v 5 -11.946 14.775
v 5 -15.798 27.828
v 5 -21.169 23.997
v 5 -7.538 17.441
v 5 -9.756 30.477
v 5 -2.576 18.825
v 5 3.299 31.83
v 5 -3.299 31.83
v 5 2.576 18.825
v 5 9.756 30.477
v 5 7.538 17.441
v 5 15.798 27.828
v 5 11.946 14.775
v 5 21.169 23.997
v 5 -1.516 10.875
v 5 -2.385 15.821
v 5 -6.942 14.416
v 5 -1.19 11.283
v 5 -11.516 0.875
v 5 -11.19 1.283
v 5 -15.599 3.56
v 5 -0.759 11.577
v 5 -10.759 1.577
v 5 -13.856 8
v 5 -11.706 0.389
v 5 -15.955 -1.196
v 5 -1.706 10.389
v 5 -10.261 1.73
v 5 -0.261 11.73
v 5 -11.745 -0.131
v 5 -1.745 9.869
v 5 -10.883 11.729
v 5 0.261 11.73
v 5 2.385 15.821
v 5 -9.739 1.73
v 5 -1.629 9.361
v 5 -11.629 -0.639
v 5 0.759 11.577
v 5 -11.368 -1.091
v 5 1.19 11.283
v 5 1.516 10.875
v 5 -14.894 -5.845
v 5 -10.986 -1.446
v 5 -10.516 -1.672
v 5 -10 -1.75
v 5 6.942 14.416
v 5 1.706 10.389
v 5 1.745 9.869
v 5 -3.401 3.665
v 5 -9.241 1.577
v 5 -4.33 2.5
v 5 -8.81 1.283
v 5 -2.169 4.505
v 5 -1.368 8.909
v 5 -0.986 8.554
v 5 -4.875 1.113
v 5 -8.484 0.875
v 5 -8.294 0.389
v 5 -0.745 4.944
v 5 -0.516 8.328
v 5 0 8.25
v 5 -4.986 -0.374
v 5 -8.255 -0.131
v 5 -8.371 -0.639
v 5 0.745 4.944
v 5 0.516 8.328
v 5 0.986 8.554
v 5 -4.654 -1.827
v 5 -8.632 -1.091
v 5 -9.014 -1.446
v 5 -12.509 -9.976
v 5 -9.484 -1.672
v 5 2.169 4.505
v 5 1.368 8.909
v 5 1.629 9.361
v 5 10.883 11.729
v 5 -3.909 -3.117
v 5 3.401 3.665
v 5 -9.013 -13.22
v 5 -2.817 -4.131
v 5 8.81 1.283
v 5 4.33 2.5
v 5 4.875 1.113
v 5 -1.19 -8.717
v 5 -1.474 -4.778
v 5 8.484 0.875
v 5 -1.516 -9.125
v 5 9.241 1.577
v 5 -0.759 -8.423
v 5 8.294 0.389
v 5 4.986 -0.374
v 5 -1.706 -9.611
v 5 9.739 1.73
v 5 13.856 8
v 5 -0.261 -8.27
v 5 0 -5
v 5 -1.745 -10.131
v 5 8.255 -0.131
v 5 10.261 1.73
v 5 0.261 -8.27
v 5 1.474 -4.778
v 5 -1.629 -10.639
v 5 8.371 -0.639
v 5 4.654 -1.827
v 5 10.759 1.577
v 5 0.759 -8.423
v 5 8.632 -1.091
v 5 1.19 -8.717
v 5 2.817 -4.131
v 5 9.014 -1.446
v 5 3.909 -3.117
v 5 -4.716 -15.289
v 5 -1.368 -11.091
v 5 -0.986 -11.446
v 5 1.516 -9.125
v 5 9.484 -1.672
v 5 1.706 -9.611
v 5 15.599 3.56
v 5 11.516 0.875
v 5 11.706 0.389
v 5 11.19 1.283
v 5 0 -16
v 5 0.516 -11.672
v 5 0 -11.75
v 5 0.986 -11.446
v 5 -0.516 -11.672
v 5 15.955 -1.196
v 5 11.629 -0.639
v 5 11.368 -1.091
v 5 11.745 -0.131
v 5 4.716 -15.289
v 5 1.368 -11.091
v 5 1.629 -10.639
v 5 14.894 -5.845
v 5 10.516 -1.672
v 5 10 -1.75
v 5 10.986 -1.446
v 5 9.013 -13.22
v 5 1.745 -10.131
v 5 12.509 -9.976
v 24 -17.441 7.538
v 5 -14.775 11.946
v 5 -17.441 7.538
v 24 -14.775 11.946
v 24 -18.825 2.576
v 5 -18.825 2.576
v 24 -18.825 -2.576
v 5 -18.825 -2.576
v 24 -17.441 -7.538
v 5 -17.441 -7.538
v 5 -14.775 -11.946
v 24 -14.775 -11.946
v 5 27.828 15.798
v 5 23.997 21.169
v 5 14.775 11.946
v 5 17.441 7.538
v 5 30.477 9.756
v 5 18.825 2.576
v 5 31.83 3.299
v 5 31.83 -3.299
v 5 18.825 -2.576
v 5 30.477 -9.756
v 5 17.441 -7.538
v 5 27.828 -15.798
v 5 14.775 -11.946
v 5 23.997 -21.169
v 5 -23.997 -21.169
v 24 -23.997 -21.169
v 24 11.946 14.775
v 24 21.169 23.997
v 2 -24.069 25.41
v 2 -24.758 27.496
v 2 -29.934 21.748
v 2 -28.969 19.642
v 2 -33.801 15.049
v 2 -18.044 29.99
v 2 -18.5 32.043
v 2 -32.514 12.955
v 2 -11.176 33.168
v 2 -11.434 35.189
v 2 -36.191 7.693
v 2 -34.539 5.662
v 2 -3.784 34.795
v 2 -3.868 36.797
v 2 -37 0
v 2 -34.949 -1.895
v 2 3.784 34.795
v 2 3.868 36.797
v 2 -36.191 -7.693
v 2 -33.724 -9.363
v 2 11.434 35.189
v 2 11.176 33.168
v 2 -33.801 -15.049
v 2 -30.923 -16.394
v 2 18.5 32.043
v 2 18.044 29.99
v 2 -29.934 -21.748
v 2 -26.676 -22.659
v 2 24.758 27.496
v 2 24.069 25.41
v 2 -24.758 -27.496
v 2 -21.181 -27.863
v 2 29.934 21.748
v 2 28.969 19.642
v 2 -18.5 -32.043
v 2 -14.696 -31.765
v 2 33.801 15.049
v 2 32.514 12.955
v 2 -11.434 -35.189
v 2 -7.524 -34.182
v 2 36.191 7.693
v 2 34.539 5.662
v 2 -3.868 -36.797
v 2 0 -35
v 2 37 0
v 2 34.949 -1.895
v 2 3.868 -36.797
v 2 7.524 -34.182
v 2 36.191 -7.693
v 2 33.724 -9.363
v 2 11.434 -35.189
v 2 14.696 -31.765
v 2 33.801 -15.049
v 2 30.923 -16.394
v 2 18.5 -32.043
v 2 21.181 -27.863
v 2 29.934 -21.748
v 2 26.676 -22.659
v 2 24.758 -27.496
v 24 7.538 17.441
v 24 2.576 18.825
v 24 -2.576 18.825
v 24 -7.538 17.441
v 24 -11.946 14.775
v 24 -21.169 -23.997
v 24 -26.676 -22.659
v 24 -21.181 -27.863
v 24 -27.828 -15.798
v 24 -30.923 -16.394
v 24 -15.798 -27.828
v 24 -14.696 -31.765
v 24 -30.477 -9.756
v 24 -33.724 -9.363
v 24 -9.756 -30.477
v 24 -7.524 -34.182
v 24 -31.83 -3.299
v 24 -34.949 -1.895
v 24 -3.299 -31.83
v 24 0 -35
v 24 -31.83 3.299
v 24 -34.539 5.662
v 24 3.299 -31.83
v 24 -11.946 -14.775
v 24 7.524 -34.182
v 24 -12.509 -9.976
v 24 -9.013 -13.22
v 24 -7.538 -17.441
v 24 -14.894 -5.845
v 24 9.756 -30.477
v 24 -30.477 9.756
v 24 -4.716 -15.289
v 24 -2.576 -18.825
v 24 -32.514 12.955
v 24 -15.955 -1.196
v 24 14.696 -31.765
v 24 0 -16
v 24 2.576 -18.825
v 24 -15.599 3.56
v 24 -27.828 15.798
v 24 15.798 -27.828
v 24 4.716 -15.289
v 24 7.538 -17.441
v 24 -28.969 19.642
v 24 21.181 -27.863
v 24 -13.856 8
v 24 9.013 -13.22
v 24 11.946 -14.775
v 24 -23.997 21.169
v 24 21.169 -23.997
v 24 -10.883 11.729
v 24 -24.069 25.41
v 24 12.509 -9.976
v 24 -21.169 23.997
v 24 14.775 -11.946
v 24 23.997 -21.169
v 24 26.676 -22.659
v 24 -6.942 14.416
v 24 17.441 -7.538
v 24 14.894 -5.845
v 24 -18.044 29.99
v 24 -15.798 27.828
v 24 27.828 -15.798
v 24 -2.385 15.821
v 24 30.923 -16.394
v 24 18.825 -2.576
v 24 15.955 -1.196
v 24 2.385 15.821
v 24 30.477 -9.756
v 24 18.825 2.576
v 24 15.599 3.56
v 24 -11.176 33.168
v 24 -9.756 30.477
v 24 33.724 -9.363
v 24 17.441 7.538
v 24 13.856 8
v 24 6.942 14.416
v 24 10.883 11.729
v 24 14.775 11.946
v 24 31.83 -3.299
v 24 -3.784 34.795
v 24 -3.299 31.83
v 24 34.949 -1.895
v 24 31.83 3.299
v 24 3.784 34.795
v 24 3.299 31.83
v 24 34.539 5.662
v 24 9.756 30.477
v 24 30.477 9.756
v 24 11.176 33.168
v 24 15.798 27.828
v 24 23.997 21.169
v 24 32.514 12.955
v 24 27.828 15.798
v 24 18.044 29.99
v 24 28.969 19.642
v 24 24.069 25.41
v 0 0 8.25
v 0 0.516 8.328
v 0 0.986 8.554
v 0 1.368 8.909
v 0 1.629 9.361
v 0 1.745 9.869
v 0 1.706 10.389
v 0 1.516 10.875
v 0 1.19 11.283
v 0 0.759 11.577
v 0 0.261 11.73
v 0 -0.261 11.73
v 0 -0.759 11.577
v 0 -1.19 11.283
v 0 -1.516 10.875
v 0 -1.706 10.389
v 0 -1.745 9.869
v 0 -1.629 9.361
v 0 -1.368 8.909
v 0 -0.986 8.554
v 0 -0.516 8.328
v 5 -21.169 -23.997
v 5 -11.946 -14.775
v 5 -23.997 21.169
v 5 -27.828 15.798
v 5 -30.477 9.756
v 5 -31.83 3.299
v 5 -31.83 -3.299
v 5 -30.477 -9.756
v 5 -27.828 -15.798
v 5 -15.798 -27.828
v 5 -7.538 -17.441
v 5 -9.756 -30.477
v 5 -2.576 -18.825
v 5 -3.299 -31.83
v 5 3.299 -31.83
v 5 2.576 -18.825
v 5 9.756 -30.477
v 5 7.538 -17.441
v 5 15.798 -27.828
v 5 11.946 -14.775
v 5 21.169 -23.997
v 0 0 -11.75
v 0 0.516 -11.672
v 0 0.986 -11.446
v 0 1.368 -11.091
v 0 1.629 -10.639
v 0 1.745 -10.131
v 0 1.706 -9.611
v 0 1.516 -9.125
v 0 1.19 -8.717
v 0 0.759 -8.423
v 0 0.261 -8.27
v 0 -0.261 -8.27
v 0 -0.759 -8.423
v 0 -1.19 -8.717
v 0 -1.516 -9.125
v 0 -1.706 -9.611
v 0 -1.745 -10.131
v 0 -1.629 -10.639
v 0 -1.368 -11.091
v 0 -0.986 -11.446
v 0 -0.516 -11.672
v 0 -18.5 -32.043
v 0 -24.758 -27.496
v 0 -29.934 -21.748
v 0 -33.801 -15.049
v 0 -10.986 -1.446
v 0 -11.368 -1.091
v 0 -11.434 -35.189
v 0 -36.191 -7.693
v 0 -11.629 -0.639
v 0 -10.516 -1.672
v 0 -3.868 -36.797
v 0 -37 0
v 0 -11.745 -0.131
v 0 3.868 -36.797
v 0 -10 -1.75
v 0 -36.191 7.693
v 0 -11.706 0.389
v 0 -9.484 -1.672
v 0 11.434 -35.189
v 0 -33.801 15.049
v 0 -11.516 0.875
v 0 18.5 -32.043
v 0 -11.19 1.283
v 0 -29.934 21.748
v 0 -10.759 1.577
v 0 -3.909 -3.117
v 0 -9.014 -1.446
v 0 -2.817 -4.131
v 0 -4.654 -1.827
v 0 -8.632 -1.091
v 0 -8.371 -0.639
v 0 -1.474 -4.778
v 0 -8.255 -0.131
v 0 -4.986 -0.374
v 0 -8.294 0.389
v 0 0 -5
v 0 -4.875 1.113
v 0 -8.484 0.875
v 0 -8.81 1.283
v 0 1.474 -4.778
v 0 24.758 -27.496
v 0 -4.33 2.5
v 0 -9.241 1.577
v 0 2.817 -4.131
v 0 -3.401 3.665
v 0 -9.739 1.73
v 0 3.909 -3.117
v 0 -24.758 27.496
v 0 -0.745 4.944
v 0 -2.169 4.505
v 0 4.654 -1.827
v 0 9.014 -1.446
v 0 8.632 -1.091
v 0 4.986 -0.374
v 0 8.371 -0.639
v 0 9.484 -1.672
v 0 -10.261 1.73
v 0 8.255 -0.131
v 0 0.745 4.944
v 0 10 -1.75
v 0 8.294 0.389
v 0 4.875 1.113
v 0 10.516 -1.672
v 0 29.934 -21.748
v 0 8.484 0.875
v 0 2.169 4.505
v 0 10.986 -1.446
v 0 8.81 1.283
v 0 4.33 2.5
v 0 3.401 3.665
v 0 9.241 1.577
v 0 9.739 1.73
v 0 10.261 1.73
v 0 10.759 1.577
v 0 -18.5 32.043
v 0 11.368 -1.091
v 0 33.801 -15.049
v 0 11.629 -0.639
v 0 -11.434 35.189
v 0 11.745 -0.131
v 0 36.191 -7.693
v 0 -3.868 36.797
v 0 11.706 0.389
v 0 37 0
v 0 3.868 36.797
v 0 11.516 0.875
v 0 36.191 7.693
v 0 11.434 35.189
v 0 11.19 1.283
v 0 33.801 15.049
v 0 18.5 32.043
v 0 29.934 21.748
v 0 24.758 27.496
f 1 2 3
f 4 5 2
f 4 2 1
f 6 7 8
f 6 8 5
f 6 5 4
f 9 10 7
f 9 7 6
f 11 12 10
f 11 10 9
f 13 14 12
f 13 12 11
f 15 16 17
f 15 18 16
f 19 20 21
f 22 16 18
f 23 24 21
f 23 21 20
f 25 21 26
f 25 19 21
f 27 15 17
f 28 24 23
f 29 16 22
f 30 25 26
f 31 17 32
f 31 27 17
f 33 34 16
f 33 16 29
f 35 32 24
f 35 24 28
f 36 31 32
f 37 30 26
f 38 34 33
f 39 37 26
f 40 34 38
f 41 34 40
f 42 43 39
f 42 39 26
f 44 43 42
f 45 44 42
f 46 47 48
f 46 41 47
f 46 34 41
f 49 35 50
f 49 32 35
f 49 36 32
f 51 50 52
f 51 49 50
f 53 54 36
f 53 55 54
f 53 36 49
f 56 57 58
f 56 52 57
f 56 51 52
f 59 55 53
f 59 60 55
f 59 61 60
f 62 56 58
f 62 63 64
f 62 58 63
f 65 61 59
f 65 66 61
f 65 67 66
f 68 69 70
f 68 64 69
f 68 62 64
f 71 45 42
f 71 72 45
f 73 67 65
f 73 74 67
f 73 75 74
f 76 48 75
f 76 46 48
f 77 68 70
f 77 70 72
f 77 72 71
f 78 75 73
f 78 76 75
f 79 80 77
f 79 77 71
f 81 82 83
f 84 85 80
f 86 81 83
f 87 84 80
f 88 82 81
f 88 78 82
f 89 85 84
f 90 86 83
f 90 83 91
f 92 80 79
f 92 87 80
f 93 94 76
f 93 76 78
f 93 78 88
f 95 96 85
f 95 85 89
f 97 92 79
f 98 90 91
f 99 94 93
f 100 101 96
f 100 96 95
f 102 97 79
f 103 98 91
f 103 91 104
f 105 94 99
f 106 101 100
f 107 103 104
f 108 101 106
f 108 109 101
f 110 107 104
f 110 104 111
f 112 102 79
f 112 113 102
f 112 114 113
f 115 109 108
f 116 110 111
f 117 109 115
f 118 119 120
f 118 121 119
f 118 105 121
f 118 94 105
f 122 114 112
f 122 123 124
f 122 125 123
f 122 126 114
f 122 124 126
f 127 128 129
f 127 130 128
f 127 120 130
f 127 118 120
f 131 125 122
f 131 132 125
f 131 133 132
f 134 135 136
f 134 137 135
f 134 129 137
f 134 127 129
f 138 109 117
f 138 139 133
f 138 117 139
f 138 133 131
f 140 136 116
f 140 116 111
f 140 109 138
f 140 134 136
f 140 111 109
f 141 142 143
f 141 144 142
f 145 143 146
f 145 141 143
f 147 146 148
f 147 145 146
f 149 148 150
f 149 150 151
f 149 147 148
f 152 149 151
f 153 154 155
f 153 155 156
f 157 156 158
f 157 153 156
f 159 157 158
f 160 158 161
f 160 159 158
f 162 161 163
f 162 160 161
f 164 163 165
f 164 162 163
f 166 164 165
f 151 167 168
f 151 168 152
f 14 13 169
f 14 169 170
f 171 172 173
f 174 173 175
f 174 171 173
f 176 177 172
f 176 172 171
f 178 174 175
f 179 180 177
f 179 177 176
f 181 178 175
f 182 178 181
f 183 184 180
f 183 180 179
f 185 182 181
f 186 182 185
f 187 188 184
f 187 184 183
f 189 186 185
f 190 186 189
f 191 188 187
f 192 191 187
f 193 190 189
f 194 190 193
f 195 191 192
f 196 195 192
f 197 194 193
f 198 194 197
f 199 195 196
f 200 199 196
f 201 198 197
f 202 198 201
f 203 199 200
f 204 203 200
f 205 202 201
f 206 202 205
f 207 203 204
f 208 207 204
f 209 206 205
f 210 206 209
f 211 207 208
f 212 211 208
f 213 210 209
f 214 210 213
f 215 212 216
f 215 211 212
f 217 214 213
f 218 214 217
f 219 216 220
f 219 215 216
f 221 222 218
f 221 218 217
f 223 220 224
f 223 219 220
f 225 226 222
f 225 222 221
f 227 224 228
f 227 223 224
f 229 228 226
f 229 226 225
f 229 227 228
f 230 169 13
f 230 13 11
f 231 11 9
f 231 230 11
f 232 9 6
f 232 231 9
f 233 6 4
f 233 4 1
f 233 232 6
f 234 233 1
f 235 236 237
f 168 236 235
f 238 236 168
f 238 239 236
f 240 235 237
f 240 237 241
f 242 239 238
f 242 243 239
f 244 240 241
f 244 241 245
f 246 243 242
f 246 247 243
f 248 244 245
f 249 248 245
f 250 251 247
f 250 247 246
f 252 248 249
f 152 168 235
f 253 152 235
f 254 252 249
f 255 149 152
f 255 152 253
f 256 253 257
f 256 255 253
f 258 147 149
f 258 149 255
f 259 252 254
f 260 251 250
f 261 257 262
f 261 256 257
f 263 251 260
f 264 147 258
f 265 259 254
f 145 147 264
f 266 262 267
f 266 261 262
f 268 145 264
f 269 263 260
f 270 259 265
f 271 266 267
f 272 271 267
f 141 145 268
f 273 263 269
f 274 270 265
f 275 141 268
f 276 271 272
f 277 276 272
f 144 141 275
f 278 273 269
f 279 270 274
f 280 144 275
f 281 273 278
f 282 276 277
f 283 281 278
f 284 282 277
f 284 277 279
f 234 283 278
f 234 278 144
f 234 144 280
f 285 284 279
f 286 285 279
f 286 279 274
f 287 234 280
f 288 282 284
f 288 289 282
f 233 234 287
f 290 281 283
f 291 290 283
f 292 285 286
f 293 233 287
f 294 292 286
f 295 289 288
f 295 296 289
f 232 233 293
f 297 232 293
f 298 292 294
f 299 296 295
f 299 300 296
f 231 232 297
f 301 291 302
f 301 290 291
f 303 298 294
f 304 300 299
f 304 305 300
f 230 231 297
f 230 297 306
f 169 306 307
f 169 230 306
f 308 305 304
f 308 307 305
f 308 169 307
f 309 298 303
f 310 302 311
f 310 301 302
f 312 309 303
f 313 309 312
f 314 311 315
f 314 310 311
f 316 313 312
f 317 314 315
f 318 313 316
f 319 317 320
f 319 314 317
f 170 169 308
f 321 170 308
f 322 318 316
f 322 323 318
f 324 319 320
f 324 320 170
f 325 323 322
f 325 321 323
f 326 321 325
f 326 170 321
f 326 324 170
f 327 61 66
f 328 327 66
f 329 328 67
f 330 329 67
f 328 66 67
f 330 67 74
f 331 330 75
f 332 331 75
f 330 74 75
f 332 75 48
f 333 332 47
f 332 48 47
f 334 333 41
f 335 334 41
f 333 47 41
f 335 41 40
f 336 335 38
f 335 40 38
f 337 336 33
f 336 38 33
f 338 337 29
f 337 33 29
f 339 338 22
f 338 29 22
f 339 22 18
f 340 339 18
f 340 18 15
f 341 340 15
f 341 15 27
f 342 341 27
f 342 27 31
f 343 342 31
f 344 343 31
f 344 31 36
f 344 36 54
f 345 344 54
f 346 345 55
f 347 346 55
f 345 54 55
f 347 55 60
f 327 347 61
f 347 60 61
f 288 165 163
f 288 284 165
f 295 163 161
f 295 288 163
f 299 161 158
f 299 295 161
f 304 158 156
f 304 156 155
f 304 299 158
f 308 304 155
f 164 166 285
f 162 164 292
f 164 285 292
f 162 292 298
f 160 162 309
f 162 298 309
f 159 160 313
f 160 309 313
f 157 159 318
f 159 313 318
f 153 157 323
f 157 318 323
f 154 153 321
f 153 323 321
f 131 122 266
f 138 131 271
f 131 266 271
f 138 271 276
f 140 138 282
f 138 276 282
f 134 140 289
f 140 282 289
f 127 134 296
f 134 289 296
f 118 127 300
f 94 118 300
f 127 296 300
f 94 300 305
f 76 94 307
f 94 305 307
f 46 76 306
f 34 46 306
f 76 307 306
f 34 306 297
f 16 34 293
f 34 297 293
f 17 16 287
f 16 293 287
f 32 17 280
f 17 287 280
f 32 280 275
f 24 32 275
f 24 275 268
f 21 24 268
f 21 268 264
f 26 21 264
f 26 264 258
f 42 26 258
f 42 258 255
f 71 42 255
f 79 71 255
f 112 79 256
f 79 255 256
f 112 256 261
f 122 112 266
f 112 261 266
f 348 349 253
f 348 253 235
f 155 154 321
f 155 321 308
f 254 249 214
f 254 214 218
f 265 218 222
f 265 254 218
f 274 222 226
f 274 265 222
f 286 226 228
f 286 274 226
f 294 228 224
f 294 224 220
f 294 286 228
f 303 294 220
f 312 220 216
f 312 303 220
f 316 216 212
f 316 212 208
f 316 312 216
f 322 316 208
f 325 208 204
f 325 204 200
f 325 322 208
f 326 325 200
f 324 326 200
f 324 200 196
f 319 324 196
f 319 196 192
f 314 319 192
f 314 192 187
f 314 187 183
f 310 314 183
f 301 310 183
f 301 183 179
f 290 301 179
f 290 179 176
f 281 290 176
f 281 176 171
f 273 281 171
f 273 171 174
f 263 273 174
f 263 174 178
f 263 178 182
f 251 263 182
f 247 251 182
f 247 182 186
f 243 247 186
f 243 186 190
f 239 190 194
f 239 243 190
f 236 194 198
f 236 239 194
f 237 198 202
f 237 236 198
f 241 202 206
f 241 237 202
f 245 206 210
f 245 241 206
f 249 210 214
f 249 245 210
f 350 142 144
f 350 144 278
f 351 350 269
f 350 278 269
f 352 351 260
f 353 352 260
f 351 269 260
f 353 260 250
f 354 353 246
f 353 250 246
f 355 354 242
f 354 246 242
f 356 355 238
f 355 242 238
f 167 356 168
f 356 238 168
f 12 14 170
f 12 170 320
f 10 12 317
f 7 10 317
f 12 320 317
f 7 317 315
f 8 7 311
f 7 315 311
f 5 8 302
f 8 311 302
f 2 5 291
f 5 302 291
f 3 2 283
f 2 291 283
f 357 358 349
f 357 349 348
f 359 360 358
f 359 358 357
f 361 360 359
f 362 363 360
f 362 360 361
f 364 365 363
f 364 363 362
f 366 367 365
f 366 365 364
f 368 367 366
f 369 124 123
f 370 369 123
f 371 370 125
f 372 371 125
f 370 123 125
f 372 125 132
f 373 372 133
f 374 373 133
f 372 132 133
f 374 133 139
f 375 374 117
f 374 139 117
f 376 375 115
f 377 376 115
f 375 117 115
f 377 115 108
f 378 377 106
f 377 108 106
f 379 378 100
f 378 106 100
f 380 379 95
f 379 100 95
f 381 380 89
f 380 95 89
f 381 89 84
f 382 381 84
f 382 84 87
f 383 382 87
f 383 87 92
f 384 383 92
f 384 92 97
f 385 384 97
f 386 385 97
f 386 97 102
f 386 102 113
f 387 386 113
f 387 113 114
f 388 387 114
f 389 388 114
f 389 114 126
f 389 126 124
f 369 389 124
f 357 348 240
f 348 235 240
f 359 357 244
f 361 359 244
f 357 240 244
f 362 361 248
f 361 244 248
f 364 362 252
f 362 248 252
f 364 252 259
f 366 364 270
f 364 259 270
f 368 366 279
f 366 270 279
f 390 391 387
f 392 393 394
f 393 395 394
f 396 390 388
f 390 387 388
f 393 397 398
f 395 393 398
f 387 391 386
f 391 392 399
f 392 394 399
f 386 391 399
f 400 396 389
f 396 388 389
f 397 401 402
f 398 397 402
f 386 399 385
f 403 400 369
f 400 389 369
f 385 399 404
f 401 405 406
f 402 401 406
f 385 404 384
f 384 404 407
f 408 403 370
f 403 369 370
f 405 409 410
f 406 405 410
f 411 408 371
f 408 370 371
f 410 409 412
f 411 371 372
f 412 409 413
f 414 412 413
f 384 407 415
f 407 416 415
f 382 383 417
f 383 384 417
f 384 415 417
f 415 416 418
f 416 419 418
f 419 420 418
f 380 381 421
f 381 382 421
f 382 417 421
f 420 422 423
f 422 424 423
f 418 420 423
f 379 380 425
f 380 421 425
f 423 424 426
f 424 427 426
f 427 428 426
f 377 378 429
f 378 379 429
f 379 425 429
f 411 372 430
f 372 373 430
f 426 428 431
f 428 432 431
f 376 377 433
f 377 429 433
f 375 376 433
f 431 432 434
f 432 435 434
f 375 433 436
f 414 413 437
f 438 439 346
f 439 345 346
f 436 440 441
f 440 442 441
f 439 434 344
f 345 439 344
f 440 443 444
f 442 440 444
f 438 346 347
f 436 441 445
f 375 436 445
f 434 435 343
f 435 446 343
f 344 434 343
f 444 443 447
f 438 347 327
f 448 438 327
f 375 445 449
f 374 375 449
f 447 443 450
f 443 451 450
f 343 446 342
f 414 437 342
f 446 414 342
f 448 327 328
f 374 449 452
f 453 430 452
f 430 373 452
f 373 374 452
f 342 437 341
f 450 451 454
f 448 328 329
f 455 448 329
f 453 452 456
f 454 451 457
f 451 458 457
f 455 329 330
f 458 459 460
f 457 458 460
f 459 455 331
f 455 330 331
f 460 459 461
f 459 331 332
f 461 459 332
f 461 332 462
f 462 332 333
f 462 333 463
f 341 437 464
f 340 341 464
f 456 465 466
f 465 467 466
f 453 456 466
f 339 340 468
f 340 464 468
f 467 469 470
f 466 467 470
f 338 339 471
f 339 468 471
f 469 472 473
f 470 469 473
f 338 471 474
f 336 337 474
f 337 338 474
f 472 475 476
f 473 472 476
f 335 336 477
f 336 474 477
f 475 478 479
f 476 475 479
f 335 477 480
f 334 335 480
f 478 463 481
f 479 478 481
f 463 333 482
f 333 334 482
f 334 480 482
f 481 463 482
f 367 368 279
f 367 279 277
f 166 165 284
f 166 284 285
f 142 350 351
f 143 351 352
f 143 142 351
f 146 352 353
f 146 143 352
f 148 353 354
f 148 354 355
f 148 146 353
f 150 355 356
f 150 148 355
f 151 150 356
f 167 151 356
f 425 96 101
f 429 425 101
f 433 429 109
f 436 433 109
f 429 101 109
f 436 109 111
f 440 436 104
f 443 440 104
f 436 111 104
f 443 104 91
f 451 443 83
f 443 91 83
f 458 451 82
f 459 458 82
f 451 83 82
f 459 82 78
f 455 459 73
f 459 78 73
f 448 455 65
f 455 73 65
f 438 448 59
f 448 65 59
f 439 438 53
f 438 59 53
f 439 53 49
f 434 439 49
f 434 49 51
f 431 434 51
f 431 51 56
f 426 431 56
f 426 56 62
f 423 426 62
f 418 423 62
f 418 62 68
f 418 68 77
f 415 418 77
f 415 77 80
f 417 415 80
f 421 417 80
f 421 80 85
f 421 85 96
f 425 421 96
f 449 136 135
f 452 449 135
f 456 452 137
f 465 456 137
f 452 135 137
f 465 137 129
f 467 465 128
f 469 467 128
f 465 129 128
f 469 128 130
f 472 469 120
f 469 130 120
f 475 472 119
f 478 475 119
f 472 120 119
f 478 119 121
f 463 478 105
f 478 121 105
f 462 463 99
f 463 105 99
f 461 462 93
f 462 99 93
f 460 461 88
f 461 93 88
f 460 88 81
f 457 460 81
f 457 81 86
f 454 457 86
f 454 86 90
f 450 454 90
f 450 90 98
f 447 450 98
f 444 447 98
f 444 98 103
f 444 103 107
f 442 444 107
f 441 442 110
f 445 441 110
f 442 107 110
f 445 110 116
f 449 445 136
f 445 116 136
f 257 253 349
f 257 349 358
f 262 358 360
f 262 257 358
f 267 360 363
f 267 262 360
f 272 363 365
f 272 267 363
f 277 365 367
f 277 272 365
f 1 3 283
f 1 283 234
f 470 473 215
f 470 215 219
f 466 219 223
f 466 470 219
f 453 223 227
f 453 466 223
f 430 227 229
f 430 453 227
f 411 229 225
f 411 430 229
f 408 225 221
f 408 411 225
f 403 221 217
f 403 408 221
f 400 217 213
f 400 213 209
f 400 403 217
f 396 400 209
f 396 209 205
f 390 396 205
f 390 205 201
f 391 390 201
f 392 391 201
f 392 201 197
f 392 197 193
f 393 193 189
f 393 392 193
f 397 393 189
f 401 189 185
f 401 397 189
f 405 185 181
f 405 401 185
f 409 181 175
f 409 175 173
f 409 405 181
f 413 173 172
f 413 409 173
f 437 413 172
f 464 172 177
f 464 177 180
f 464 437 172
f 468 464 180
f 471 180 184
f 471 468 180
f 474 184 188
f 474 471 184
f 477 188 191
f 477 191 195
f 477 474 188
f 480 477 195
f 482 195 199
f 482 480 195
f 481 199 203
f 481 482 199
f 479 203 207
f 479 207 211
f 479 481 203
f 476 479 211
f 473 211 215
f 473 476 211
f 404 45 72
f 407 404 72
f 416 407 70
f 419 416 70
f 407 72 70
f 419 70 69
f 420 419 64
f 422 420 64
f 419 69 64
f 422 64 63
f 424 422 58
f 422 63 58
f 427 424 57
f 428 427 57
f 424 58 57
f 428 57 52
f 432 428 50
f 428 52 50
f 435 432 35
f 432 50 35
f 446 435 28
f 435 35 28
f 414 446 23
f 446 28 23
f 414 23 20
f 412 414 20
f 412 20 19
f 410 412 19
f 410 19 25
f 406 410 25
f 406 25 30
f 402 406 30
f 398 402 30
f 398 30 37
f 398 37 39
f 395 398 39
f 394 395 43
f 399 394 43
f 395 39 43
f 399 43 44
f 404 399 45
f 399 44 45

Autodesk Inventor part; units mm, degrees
ref_plane "YZ Plane" through (0, 0, 0) normal (1, 0, 0) x (0, 1, 0)
ref_plane "XZ Plane" through (0, 0, 0) normal (0, 1, 0) x (-1, 0, 0)
ref_plane "XY Plane" through (0, 0, 0) normal (0, 0, 1) x (1, 0, 0)
sketch "스케치1" plane through (0, 0, 0) normal (1, 0, 0) x (0, 1, 0)
  circle A0 centre (0, 0) radius 37
  dimension "d0" = 74
extrude "돌출1" add sketch "스케치1" along normal blind 24
sketch "스케치2" plane through (24, 0, 0) normal (1, 0, 0) x (0, 0, -1)
  circle A0 centre (0, 0) radius 5
  dimension "d3" = 10
extrude "돌출2" cut sketch "스케치2" against normal blind 24
sketch "스케치3" plane through (24, 0, 0) normal (1, 0, 0) x (0, 0, -1)
  circle A0 centre (0, 0) radius 5
  circle A1 centre (0, 0) radius 16
extrude "돌출4" cut sketch "스케치3" against normal blind 19
sketch "스케치4" plane through (5, 0, 0) normal (1, 0, 0) x (0, 0, -1)
  circle A0 centre (-10, 0) radius 1.75
  circle A1 centre (0, 10) radius 1.75
  circle A2 centre (10, 0) radius 1.75
  circle A3 centre (0, -10) radius 1.75
  point P0 (0, 0)
  dimension "d21" = 3.5
  dimension "d22" = 3.5
  dimension "d23" = 3.5
  dimension "d24" = 3.5
extrude "돌출5" cut sketch "스케치4" against normal blind 19
sketch "스케치5" plane through (24, 0, 0) normal (1, 0, 0) x (0, 0, -1)
  circle A0 centre (0, 0) radius 19
  circle A1 centre (0, 0) radius 32
  line L0 (0, 0) -> (-22.6274, 22.6274)
  line L1 (0, 0) -> (32, 0) construction
  line L2 (-22.6274, 22.6274) -> (22.6274, -22.6274)
  line L3 (0, 0) -> (-22.6274, -22.6274)
  line L4 (0, 0) -> (32, 0) construction
  line L5 (-22.6274, -22.6274) -> (22.6274, 22.6274)
  line L6 (-18, 18) -> (-16.5858, 19.4142)
  line L7 (-16.5858, 19.4142) -> (-19.4142, 16.5858)
  line L8 (-16.5858, 19.4142) -> (-11.9462, 14.7746)
  line L9 (-21.169, 23.9974) -> (-16.5858, 19.4142)
  line L10 (-19.4142, 16.5858) -> (-23.9974, 21.169)
  line L11 (-14.7746, 11.9462) -> (-19.4142, 16.5858)
  line L12 (18, 18) -> (16.5858, 19.4142)
  line L13 (16.5858, 19.4142) -> (19.4142, 16.5858)
  line L14 (19.4142, 16.5858) -> (14.7746, 11.9462)
  line L15 (23.9974, 21.169) -> (19.4142, 16.5858)
  line L16 (16.5858, 19.4142) -> (21.169, 23.9974)
  line L17 (16.5858, 19.4142) -> (11.9462, 14.7746)
  line L18 (18, -18) -> (19.4142, -16.5858)
  line L19 (19.4142, -16.5858) -> (16.5858, -19.4142)
  line L20 (16.5858, -19.4142) -> (11.9462, -14.7746)
  line L21 (16.5858, -19.4142) -> (21.169, -23.9974)
  line L22 (19.4142, -16.5858) -> (14.7746, -11.9462)
  line L23 (19.4142, -16.5858) -> (23.9974, -21.169)
  line L24 (-18, -18) -> (-19.4142, -16.5858)
  line L25 (-19.4142, -16.5858) -> (-16.5858, -19.4142)
  line L26 (-16.5858, -19.4142) -> (-11.9462, -14.7746)
  line L27 (-16.5858, -19.4142) -> (-21.169, -23.9974)
  line L28 (-19.4142, -16.5858) -> (-14.7746, -11.9462)
  line L29 (-23.9974, -21.169) -> (-19.4142, -16.5858)
  dimension "d27" = 38
  dimension "d28" = 64
  dimension "d29" = 135
  dimension "d30" = 135
  dimension "d31" = 2
  dimension "d32" = 4
  dimension "d33" = 2
extrude "돌출6" cut sketch "스케치5" against normal blind 19 contours A0 L14 L15 A1 L23 L22 | A0 L8 L9 A1 L16 L17 | L20 L21 A1 L27 L26 A0 | A0 L28 L29 A1 L10 L11
sketch "스케치6" plane through (24, 0, 0) normal (1, 0, 0) x (0, 0, -1)
  circle A0 centre (0, 0) radius 35
  circle A1 centre (0, 0) radius 37
  dimension "d36" = 70
  dimension "d37" = 74
extrude "돌출7" cut sketch "스케치6" against normal blind 22
properties part number "바퀴" material "아세탈 수지, 검은색"
